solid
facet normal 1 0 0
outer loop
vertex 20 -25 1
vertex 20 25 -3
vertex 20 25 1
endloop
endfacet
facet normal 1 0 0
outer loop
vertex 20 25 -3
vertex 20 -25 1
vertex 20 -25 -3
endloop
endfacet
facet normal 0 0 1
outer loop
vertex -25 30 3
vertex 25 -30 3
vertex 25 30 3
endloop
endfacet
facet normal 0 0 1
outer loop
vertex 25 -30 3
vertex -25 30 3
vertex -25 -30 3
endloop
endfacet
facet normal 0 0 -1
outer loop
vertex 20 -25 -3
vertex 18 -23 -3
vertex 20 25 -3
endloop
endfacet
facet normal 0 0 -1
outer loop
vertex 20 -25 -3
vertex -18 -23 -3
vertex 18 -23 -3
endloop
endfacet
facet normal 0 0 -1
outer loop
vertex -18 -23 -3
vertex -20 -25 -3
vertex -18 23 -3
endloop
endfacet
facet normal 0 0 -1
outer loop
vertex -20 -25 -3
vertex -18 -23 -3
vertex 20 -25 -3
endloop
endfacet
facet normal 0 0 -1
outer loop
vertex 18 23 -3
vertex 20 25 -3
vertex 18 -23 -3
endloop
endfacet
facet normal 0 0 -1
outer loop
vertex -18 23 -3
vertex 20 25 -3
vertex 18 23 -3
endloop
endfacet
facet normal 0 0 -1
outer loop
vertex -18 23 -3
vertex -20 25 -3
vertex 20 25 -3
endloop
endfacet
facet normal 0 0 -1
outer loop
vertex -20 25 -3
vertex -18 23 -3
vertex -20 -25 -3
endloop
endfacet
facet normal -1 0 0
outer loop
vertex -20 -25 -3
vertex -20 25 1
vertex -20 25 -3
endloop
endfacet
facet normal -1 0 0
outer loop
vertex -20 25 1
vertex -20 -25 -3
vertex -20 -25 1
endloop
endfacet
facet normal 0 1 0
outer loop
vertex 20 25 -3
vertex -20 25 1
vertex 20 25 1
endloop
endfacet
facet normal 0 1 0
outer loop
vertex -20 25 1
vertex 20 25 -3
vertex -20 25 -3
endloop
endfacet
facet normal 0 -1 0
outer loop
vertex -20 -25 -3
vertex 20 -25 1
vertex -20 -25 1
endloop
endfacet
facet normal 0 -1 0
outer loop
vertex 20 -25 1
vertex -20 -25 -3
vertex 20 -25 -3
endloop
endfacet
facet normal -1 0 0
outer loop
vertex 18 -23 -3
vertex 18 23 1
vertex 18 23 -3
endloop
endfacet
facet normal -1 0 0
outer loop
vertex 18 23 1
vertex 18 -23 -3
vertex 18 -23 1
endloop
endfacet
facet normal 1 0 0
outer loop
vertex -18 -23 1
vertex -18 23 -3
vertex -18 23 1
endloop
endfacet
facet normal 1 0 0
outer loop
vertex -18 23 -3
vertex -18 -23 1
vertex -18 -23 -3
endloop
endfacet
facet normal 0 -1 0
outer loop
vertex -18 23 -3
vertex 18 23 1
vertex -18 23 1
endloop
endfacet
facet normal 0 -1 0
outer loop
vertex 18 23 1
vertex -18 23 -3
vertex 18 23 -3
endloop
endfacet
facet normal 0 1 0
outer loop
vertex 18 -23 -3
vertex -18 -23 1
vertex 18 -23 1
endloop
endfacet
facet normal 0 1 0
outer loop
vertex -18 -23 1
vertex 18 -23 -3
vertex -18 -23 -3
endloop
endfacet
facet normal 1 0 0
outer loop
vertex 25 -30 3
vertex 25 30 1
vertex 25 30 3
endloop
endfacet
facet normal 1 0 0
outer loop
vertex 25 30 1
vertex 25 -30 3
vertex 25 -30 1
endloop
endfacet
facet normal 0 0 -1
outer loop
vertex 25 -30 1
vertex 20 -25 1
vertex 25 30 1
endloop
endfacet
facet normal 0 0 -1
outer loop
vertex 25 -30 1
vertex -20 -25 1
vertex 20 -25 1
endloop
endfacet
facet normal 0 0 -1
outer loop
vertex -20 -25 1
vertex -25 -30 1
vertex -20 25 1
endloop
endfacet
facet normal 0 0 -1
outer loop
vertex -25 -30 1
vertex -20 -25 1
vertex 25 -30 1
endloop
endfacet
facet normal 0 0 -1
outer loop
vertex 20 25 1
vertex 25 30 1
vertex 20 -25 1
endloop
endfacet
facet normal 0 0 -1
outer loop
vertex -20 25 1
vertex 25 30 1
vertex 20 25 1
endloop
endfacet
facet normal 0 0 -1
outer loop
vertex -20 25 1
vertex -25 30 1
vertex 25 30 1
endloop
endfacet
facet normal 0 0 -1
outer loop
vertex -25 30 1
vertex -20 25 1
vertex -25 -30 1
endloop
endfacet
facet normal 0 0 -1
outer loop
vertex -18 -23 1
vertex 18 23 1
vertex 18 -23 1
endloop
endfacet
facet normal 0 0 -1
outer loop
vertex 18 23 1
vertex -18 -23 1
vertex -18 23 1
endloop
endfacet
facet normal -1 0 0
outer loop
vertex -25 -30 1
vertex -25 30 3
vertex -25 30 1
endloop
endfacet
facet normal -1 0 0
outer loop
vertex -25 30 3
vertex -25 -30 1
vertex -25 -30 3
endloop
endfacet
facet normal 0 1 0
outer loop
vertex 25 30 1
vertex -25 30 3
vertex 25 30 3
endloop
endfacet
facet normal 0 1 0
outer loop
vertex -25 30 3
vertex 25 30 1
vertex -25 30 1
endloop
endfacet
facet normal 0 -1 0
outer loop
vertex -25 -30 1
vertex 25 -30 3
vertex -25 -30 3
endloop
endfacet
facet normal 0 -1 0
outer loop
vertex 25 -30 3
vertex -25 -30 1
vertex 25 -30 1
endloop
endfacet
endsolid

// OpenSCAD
//Created by Ari M. Diacou, June 2014
//Shared under Creative Commons License: Attribution-ShareAlike 4.0 Unported (CC BY-SA 4.0) 
//see http://creativecommons.org/licenses/by-sa/4.0/

/*To get this to work offline, any image must be converted to a .dat file using the tool at http://customizer.makerbot.com/image_surface. That will output an array of values from 0-1 corresponding to the greyscale values 0-255 of the image. Inverting the colors of the image will ensure that the recessed image gets subracted from other objects properly. Copy the array to a text file. IMPORTANT: be sure that your file is actually a dat file and not e.g. foo.dat.txt. Some operating systems (like Windows 7 by default) hide the actual extension. Once the dat files are in the same directory as the .scad file, and are named properly the surface() function should work.

The way I prepared my image files was to:
	1	Import the image into gimp.
	2	Crop the image as tightly as possible
	3	Right click on the image: Image>Scale Image
	4	With the aspect ratio locked, change the Higher of the width and height to 100 pixils.
	5	Right click on the image: Image>Canvas Size
	6	With the aspect ratio UNlocked, change the Lower of the width and height to 100 pixils. Click "Center". Click "Resize".
	7	Right click on the image: Colors>Brightness-Contrast
	8	Increase the contrast to remove the effects of the resize, and get sharper edges.
	9	Export the file to jpg/gif/bmp/png (it doesnt really matter as long as the customizer tool can read the file).
	10	Open  http://customizer.makerbot.com/image_surface in a web browser.
	11	Select the file you want to convert. White will make holes, so dont "Invert Colors" for this thing.
	12	Copy the array of numbers to a text file. 
	13	File>Save As. In the drop-down menu "Save as type:" select "All files". This will allow you to actually set the extenstion to ".dat". Name the file <whatever>.dat.
	
Your image should now ceate a surface() as intended. */


// Load a 100x100 pixel image for the top. (images will be automatically stretched to fit) Simple, high contrast images like logos work best. White will become holes, black will remain structural, so DONT "Invert Colors" for this thing.
grill_img = "grill.dat"; // [image_surface:100x100]
//The largest width of your plate
x=40;
//The largest height of your plate
y=50;
//The depth of your plate
z=6;
//How far does the plate overhang the hole in the box?
lip=5;
//The thickness of the lip
thickness=2;
//What was the largest number of pixils in the image?
pixils=100;
image_size=min(x,y)-2*thickness;

grill_2();

module grill_1(){
	difference(){
		union(){
			cube([x,y,z],center=true);
			translate([0,0,(z-thickness)/2])
				cube([x+2*lip,y+2*lip,thickness],center=true);
			}
		scale([image_size/pixils,image_size/pixils,z]) 
			surface(file=grill_img, center=true, convexity=10);
		translate([0,0,-(z-thickness)/2])
			cube([x-2*thickness,y-2*thickness,z-thickness],center=true);
		}
	}

module grill_2(){
	difference(){
		cube([x,y,z],center=true);
		#cube([x-2*thickness,y-2*thickness,z],center=true);
		}
	
	difference(){
		translate([0,0,(z-thickness)/2])
			cube([x+2*lip,y+2*lip,thickness],center=true);
		scale([image_size/pixils,image_size/pixils,z]) 
			surface(file=grill_img, center=true, convexity=10);
		}
	}
